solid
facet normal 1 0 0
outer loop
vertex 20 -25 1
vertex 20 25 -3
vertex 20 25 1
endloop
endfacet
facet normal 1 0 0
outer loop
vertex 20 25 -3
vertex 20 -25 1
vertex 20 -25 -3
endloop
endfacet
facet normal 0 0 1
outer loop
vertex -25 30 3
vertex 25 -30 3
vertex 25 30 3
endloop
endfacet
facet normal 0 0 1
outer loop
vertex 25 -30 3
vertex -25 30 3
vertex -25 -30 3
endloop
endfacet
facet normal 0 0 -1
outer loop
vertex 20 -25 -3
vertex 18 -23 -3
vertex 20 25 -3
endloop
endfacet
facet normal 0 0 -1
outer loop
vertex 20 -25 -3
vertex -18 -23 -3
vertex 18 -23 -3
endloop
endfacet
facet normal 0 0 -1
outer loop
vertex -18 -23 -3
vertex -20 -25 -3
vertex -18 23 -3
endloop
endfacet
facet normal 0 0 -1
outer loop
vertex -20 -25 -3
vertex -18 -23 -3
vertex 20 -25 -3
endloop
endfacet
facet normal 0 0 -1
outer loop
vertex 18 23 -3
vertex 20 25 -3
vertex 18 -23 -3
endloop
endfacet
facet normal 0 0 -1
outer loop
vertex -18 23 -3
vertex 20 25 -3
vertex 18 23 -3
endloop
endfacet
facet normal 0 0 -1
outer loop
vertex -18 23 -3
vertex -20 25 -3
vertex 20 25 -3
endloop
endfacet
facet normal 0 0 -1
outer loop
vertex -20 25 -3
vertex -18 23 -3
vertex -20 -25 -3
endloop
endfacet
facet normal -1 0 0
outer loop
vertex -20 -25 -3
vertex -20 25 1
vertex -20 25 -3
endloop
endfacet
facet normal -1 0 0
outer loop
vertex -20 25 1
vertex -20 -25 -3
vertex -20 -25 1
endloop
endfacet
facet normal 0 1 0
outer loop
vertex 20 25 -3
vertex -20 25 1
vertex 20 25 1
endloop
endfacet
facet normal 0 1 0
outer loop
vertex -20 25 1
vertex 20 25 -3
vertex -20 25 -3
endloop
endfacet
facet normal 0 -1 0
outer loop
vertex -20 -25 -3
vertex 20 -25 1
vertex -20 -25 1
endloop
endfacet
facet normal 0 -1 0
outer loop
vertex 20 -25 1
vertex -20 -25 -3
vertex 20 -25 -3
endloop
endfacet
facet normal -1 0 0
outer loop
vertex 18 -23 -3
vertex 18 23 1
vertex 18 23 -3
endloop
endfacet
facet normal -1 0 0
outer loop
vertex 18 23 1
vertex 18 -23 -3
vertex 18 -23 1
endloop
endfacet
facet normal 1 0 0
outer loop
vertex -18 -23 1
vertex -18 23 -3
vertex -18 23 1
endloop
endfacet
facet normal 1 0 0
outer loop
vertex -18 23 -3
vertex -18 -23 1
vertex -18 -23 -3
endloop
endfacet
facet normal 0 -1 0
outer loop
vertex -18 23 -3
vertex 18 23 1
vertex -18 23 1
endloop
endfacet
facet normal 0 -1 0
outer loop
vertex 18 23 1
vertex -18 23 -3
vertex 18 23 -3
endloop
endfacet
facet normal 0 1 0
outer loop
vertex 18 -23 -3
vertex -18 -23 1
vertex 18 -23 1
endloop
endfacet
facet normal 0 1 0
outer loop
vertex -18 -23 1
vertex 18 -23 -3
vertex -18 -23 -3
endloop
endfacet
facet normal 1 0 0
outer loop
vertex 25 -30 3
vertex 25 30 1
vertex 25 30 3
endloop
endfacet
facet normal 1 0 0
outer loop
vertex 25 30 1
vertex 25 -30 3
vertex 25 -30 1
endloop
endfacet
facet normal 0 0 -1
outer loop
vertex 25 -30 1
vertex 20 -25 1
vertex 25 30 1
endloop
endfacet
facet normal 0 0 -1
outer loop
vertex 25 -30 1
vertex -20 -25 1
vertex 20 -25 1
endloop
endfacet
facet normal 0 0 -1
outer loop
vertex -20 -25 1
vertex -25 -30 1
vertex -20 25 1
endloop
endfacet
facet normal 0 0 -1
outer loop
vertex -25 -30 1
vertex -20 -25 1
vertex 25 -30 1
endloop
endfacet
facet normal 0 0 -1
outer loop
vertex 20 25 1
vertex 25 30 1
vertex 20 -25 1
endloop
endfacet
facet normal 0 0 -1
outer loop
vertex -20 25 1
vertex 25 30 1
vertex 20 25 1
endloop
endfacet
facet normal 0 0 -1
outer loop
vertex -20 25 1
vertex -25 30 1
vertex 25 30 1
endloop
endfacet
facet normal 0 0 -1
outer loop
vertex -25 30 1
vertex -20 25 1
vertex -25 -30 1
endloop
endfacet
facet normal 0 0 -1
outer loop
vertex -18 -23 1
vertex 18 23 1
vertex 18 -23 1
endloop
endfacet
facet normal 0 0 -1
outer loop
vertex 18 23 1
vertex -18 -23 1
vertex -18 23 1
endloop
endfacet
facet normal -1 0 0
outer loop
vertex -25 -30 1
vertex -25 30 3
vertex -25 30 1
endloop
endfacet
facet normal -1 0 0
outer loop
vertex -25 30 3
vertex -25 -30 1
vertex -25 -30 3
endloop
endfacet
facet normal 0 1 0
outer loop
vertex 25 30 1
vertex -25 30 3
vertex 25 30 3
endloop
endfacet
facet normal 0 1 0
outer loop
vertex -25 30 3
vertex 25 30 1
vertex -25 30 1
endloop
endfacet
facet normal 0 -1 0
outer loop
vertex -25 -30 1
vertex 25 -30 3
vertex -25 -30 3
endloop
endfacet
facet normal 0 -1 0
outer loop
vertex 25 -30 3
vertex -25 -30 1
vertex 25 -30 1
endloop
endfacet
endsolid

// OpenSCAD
//Created by Ari M. Diacou, June 2014
//Shared under Creative Commons License: Attribution-ShareAlike 4.0 Unported (CC BY-SA 4.0) 
//see http://creativecommons.org/licenses/by-sa/4.0/

/*To get this to work offline, any image must be converted to a .dat file using the tool at http://customizer.makerbot.com/image_surface. That will output an array of values from 0-1 corresponding to the greyscale values 0-255 of the image. Inverting the colors of the image will ensure that the recessed image gets subracted from other objects properly. Copy the array to a text file. IMPORTANT: be sure that your file is actually a dat file and not e.g. foo.dat.txt. Some operating systems (like Windows 7 by default) hide the actual extension. Once the dat files are in the same directory as the .scad file, and are named properly the surface() function should work.

The way I prepared my image files was to:
	1	Import the image into gimp.
	2	Crop the image as tightly as possible
	3	Right click on the image: Image>Scale Image
	4	With the aspect ratio locked, change the Higher of the width and height to 100 pixils.
	5	Right click on the image: Image>Canvas Size
	6	With the aspect ratio UNlocked, change the Lower of the width and height to 100 pixils. Click "Center". Click "Resize".
	7	Right click on the image: Colors>Brightness-Contrast
	8	Increase the contrast to remove the effects of the resize, and get sharper edges.
	9	Export the file to jpg/gif/bmp/png (it doesnt really matter as long as the customizer tool can read the file).
	10	Open  http://customizer.makerbot.com/image_surface in a web browser.
	11	Select the file you want to convert. White will make holes, so dont "Invert Colors" for this thing.
	12	Copy the array of numbers to a text file. 
	13	File>Save As. In the drop-down menu "Save as type:" select "All files". This will allow you to actually set the extenstion to ".dat". Name the file <whatever>.dat.
	
Your image should now ceate a surface() as intended. */


// Load a 100x100 pixel image for the top. (images will be automatically stretched to fit) Simple, high contrast images like logos work best. White will become holes, black will remain structural, so DONT "Invert Colors" for this thing.
grill_img = "grill.dat"; // [image_surface:100x100]
//The largest width of your plate
x=40;
//The largest height of your plate
y=50;
//The depth of your plate
z=6;
//How far does the plate overhang the hole in the box?
lip=5;
//The thickness of the lip
thickness=2;
//What was the largest number of pixils in the image?
pixils=100;
image_size=min(x,y)-2*thickness;

grill_2();

module grill_1(){
	difference(){
		union(){
			cube([x,y,z],center=true);
			translate([0,0,(z-thickness)/2])
				cube([x+2*lip,y+2*lip,thickness],center=true);
			}
		scale([image_size/pixils,image_size/pixils,z]) 
			surface(file=grill_img, center=true, convexity=10);
		translate([0,0,-(z-thickness)/2])
			cube([x-2*thickness,y-2*thickness,z-thickness],center=true);
		}
	}

module grill_2(){
	difference(){
		cube([x,y,z],center=true);
		#cube([x-2*thickness,y-2*thickness,z],center=true);
		}
	
	difference(){
		translate([0,0,(z-thickness)/2])
			cube([x+2*lip,y+2*lip,thickness],center=true);
		scale([image_size/pixils,image_size/pixils,z]) 
			surface(file=grill_img, center=true, convexity=10);
		}
	}
